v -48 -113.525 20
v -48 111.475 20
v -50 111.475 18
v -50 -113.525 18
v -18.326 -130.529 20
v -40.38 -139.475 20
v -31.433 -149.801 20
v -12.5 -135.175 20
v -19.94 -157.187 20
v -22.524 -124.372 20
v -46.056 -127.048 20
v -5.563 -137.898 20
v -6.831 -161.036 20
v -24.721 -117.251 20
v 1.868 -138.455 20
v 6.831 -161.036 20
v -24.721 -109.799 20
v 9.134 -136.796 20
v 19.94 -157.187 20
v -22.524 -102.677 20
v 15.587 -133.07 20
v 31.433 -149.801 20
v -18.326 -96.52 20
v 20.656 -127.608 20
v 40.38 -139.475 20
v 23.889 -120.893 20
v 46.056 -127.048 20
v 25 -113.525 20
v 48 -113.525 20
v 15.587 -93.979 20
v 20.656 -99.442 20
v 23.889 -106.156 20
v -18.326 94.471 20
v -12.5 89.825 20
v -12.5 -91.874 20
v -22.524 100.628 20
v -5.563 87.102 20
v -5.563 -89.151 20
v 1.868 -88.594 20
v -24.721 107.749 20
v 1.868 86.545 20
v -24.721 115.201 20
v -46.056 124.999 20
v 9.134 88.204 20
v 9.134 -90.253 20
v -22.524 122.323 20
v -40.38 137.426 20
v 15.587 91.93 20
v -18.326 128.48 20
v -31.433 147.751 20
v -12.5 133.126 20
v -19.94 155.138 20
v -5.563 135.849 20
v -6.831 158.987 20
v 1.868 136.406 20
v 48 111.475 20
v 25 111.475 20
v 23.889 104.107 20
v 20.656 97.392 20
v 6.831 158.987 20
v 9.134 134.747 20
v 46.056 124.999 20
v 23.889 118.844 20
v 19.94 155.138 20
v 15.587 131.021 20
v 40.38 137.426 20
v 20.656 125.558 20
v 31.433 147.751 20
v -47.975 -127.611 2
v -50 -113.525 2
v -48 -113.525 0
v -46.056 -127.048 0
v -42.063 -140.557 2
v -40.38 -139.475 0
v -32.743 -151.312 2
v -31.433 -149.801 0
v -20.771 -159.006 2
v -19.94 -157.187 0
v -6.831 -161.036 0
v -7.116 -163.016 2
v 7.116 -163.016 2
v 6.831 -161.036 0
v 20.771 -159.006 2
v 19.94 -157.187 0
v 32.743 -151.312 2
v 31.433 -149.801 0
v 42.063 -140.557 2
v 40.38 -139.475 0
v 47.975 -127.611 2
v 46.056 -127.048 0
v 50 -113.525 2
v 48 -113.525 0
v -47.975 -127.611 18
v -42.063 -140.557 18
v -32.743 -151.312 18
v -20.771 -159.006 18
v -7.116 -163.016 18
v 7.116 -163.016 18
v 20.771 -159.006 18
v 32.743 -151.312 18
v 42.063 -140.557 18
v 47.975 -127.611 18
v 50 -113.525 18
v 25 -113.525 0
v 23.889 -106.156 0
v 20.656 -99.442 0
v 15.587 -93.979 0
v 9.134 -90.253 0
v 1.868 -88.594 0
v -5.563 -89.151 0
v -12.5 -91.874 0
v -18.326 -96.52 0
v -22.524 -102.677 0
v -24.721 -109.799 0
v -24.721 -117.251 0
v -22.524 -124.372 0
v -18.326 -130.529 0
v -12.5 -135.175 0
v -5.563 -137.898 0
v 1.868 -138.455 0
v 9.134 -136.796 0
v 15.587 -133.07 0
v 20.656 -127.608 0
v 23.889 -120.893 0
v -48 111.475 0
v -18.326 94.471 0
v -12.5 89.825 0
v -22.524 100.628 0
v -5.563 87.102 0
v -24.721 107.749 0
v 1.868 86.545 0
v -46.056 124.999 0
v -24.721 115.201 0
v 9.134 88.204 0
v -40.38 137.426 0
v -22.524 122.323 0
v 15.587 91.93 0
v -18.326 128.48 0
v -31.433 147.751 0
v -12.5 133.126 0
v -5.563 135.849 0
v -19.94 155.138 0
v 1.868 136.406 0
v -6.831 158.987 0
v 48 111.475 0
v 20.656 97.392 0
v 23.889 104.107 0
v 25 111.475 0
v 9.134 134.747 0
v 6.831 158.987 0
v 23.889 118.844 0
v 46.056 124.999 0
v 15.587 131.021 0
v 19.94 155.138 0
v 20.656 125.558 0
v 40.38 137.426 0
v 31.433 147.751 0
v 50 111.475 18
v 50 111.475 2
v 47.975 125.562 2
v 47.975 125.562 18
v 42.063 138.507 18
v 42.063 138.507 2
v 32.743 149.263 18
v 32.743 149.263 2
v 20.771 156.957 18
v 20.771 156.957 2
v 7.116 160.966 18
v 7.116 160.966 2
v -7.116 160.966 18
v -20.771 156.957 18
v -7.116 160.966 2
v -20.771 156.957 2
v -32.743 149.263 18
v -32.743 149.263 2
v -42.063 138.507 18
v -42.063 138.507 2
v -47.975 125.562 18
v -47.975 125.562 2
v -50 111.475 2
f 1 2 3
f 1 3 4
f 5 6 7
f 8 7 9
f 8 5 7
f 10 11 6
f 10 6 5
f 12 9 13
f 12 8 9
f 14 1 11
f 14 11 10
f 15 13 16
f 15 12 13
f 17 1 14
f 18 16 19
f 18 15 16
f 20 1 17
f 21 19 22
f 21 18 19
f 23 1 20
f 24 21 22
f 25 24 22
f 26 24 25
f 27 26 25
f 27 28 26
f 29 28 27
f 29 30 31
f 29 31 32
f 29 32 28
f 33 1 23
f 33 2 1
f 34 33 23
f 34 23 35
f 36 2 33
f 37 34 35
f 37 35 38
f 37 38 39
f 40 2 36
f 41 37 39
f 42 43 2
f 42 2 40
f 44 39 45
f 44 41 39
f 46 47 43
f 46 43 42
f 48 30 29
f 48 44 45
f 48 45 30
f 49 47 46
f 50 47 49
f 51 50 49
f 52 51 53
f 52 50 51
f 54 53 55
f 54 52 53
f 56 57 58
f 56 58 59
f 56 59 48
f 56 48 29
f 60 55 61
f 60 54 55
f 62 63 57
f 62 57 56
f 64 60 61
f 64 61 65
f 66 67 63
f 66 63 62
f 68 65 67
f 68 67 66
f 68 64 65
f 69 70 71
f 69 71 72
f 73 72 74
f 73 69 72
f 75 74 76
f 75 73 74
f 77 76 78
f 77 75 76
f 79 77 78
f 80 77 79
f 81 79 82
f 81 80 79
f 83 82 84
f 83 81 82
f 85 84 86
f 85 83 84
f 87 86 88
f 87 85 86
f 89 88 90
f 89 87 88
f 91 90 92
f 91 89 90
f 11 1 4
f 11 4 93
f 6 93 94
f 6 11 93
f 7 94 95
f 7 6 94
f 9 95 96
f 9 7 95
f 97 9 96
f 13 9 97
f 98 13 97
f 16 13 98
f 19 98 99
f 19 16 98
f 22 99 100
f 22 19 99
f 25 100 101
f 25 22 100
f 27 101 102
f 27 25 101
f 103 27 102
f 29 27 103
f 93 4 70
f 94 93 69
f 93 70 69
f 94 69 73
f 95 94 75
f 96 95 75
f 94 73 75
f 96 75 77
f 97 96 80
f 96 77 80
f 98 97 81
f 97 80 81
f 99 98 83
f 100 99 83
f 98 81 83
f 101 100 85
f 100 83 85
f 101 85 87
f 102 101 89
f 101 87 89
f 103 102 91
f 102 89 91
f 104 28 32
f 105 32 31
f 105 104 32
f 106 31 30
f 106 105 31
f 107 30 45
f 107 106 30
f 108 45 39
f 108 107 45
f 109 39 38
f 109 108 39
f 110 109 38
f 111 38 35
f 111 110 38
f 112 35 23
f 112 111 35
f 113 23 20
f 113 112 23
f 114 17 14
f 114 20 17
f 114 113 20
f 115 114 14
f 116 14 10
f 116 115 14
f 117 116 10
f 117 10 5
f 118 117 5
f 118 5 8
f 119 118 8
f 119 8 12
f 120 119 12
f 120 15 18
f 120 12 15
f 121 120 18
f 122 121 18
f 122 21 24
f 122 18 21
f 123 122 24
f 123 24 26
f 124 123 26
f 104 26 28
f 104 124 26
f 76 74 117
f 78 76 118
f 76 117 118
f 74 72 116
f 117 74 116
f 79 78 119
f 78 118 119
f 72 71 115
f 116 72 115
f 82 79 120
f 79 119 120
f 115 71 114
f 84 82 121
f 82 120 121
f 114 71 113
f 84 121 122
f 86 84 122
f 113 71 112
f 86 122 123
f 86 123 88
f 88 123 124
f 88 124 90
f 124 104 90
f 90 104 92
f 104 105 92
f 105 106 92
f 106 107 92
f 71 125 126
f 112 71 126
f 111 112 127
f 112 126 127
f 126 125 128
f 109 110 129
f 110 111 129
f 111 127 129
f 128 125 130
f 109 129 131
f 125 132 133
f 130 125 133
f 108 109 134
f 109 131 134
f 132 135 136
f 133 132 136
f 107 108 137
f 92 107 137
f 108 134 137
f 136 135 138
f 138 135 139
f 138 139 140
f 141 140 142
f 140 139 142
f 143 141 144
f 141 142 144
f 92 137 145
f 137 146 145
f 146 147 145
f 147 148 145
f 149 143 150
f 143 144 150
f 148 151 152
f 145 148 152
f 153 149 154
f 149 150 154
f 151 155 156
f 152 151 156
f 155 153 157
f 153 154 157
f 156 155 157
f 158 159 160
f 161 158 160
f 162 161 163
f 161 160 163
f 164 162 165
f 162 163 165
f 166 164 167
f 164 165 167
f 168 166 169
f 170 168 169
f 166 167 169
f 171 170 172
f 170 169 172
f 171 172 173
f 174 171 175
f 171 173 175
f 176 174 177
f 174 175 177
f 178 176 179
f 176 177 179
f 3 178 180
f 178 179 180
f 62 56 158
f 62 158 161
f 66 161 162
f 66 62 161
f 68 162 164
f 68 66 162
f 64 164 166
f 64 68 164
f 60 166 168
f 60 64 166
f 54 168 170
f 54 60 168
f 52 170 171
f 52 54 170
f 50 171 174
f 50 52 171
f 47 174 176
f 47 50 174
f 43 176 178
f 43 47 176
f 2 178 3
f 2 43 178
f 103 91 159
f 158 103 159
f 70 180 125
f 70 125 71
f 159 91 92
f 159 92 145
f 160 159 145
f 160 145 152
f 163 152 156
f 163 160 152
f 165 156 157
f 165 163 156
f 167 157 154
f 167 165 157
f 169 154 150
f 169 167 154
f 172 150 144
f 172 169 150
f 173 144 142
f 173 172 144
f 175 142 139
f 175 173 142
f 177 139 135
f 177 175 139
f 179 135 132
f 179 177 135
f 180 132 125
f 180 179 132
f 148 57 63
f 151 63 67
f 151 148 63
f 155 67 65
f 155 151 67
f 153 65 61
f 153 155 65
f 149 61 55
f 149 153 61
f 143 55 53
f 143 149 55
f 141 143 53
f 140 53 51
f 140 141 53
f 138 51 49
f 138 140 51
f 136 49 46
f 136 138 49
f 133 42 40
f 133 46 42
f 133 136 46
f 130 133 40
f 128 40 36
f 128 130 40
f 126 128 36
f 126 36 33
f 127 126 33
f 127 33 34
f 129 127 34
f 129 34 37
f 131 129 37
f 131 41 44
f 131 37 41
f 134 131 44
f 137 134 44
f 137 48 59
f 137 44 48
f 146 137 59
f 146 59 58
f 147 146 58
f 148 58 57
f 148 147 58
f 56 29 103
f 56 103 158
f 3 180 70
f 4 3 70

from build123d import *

# Parameters (mm, degrees)
BOSS_EXTRUDE1_DEPTH = 20
SKETCH1_3_R         = 25
CUT_EXTRUDE1_DEPTH  = 149
CHAMFER1_SIZE       = 2


with BuildPart() as part:
    # Sketch1 → Boss-Extrude1 (new body)
    with BuildSketch(Plane.XY):
        with BuildLine():
            Line((-50, 111.475422903), (-50, -113.524577097))
            ThreePointArc((-50, -113.524577097), (0, -163.524577097), (50, -113.524577097))
            Line((50, -113.524577097), (50, 111.475422903))
            ThreePointArc((50, 111.475422903), (0, 161.475422903), (-50, 111.475422903))
        make_face()
    extrude(amount=BOSS_EXTRUDE1_DEPTH)

    # Sketch1<3> → Cut-Extrude1 (cut)
    with BuildSketch(Plane.XY):
        with Locations((0, 111.475422903)):
            Circle(SKETCH1_3_R)
        with Locations((0, -113.524577097)):
            Circle(SKETCH1_3_R)
    extrude(amount=CUT_EXTRUDE1_DEPTH, mode=Mode.SUBTRACT)

    # Chamfer1
    chamfer1_edges = [part.edges().sort_by_distance(p)[0] for p in [
        (0, -163.524577097, 20),
        (50, -1.024577097, 20),
        (0, 161.475422903, 20),
        (50, -1.024577097, 0),
        (0, -163.524577097, 0),
        (-50, -1.024577097, 0),
        (0, 161.475422903, 0),
        (-50, -1.024577097, 20),
    ]]
    chamfer(chamfer1_edges, length=CHAMFER1_SIZE)


solid = part.part
